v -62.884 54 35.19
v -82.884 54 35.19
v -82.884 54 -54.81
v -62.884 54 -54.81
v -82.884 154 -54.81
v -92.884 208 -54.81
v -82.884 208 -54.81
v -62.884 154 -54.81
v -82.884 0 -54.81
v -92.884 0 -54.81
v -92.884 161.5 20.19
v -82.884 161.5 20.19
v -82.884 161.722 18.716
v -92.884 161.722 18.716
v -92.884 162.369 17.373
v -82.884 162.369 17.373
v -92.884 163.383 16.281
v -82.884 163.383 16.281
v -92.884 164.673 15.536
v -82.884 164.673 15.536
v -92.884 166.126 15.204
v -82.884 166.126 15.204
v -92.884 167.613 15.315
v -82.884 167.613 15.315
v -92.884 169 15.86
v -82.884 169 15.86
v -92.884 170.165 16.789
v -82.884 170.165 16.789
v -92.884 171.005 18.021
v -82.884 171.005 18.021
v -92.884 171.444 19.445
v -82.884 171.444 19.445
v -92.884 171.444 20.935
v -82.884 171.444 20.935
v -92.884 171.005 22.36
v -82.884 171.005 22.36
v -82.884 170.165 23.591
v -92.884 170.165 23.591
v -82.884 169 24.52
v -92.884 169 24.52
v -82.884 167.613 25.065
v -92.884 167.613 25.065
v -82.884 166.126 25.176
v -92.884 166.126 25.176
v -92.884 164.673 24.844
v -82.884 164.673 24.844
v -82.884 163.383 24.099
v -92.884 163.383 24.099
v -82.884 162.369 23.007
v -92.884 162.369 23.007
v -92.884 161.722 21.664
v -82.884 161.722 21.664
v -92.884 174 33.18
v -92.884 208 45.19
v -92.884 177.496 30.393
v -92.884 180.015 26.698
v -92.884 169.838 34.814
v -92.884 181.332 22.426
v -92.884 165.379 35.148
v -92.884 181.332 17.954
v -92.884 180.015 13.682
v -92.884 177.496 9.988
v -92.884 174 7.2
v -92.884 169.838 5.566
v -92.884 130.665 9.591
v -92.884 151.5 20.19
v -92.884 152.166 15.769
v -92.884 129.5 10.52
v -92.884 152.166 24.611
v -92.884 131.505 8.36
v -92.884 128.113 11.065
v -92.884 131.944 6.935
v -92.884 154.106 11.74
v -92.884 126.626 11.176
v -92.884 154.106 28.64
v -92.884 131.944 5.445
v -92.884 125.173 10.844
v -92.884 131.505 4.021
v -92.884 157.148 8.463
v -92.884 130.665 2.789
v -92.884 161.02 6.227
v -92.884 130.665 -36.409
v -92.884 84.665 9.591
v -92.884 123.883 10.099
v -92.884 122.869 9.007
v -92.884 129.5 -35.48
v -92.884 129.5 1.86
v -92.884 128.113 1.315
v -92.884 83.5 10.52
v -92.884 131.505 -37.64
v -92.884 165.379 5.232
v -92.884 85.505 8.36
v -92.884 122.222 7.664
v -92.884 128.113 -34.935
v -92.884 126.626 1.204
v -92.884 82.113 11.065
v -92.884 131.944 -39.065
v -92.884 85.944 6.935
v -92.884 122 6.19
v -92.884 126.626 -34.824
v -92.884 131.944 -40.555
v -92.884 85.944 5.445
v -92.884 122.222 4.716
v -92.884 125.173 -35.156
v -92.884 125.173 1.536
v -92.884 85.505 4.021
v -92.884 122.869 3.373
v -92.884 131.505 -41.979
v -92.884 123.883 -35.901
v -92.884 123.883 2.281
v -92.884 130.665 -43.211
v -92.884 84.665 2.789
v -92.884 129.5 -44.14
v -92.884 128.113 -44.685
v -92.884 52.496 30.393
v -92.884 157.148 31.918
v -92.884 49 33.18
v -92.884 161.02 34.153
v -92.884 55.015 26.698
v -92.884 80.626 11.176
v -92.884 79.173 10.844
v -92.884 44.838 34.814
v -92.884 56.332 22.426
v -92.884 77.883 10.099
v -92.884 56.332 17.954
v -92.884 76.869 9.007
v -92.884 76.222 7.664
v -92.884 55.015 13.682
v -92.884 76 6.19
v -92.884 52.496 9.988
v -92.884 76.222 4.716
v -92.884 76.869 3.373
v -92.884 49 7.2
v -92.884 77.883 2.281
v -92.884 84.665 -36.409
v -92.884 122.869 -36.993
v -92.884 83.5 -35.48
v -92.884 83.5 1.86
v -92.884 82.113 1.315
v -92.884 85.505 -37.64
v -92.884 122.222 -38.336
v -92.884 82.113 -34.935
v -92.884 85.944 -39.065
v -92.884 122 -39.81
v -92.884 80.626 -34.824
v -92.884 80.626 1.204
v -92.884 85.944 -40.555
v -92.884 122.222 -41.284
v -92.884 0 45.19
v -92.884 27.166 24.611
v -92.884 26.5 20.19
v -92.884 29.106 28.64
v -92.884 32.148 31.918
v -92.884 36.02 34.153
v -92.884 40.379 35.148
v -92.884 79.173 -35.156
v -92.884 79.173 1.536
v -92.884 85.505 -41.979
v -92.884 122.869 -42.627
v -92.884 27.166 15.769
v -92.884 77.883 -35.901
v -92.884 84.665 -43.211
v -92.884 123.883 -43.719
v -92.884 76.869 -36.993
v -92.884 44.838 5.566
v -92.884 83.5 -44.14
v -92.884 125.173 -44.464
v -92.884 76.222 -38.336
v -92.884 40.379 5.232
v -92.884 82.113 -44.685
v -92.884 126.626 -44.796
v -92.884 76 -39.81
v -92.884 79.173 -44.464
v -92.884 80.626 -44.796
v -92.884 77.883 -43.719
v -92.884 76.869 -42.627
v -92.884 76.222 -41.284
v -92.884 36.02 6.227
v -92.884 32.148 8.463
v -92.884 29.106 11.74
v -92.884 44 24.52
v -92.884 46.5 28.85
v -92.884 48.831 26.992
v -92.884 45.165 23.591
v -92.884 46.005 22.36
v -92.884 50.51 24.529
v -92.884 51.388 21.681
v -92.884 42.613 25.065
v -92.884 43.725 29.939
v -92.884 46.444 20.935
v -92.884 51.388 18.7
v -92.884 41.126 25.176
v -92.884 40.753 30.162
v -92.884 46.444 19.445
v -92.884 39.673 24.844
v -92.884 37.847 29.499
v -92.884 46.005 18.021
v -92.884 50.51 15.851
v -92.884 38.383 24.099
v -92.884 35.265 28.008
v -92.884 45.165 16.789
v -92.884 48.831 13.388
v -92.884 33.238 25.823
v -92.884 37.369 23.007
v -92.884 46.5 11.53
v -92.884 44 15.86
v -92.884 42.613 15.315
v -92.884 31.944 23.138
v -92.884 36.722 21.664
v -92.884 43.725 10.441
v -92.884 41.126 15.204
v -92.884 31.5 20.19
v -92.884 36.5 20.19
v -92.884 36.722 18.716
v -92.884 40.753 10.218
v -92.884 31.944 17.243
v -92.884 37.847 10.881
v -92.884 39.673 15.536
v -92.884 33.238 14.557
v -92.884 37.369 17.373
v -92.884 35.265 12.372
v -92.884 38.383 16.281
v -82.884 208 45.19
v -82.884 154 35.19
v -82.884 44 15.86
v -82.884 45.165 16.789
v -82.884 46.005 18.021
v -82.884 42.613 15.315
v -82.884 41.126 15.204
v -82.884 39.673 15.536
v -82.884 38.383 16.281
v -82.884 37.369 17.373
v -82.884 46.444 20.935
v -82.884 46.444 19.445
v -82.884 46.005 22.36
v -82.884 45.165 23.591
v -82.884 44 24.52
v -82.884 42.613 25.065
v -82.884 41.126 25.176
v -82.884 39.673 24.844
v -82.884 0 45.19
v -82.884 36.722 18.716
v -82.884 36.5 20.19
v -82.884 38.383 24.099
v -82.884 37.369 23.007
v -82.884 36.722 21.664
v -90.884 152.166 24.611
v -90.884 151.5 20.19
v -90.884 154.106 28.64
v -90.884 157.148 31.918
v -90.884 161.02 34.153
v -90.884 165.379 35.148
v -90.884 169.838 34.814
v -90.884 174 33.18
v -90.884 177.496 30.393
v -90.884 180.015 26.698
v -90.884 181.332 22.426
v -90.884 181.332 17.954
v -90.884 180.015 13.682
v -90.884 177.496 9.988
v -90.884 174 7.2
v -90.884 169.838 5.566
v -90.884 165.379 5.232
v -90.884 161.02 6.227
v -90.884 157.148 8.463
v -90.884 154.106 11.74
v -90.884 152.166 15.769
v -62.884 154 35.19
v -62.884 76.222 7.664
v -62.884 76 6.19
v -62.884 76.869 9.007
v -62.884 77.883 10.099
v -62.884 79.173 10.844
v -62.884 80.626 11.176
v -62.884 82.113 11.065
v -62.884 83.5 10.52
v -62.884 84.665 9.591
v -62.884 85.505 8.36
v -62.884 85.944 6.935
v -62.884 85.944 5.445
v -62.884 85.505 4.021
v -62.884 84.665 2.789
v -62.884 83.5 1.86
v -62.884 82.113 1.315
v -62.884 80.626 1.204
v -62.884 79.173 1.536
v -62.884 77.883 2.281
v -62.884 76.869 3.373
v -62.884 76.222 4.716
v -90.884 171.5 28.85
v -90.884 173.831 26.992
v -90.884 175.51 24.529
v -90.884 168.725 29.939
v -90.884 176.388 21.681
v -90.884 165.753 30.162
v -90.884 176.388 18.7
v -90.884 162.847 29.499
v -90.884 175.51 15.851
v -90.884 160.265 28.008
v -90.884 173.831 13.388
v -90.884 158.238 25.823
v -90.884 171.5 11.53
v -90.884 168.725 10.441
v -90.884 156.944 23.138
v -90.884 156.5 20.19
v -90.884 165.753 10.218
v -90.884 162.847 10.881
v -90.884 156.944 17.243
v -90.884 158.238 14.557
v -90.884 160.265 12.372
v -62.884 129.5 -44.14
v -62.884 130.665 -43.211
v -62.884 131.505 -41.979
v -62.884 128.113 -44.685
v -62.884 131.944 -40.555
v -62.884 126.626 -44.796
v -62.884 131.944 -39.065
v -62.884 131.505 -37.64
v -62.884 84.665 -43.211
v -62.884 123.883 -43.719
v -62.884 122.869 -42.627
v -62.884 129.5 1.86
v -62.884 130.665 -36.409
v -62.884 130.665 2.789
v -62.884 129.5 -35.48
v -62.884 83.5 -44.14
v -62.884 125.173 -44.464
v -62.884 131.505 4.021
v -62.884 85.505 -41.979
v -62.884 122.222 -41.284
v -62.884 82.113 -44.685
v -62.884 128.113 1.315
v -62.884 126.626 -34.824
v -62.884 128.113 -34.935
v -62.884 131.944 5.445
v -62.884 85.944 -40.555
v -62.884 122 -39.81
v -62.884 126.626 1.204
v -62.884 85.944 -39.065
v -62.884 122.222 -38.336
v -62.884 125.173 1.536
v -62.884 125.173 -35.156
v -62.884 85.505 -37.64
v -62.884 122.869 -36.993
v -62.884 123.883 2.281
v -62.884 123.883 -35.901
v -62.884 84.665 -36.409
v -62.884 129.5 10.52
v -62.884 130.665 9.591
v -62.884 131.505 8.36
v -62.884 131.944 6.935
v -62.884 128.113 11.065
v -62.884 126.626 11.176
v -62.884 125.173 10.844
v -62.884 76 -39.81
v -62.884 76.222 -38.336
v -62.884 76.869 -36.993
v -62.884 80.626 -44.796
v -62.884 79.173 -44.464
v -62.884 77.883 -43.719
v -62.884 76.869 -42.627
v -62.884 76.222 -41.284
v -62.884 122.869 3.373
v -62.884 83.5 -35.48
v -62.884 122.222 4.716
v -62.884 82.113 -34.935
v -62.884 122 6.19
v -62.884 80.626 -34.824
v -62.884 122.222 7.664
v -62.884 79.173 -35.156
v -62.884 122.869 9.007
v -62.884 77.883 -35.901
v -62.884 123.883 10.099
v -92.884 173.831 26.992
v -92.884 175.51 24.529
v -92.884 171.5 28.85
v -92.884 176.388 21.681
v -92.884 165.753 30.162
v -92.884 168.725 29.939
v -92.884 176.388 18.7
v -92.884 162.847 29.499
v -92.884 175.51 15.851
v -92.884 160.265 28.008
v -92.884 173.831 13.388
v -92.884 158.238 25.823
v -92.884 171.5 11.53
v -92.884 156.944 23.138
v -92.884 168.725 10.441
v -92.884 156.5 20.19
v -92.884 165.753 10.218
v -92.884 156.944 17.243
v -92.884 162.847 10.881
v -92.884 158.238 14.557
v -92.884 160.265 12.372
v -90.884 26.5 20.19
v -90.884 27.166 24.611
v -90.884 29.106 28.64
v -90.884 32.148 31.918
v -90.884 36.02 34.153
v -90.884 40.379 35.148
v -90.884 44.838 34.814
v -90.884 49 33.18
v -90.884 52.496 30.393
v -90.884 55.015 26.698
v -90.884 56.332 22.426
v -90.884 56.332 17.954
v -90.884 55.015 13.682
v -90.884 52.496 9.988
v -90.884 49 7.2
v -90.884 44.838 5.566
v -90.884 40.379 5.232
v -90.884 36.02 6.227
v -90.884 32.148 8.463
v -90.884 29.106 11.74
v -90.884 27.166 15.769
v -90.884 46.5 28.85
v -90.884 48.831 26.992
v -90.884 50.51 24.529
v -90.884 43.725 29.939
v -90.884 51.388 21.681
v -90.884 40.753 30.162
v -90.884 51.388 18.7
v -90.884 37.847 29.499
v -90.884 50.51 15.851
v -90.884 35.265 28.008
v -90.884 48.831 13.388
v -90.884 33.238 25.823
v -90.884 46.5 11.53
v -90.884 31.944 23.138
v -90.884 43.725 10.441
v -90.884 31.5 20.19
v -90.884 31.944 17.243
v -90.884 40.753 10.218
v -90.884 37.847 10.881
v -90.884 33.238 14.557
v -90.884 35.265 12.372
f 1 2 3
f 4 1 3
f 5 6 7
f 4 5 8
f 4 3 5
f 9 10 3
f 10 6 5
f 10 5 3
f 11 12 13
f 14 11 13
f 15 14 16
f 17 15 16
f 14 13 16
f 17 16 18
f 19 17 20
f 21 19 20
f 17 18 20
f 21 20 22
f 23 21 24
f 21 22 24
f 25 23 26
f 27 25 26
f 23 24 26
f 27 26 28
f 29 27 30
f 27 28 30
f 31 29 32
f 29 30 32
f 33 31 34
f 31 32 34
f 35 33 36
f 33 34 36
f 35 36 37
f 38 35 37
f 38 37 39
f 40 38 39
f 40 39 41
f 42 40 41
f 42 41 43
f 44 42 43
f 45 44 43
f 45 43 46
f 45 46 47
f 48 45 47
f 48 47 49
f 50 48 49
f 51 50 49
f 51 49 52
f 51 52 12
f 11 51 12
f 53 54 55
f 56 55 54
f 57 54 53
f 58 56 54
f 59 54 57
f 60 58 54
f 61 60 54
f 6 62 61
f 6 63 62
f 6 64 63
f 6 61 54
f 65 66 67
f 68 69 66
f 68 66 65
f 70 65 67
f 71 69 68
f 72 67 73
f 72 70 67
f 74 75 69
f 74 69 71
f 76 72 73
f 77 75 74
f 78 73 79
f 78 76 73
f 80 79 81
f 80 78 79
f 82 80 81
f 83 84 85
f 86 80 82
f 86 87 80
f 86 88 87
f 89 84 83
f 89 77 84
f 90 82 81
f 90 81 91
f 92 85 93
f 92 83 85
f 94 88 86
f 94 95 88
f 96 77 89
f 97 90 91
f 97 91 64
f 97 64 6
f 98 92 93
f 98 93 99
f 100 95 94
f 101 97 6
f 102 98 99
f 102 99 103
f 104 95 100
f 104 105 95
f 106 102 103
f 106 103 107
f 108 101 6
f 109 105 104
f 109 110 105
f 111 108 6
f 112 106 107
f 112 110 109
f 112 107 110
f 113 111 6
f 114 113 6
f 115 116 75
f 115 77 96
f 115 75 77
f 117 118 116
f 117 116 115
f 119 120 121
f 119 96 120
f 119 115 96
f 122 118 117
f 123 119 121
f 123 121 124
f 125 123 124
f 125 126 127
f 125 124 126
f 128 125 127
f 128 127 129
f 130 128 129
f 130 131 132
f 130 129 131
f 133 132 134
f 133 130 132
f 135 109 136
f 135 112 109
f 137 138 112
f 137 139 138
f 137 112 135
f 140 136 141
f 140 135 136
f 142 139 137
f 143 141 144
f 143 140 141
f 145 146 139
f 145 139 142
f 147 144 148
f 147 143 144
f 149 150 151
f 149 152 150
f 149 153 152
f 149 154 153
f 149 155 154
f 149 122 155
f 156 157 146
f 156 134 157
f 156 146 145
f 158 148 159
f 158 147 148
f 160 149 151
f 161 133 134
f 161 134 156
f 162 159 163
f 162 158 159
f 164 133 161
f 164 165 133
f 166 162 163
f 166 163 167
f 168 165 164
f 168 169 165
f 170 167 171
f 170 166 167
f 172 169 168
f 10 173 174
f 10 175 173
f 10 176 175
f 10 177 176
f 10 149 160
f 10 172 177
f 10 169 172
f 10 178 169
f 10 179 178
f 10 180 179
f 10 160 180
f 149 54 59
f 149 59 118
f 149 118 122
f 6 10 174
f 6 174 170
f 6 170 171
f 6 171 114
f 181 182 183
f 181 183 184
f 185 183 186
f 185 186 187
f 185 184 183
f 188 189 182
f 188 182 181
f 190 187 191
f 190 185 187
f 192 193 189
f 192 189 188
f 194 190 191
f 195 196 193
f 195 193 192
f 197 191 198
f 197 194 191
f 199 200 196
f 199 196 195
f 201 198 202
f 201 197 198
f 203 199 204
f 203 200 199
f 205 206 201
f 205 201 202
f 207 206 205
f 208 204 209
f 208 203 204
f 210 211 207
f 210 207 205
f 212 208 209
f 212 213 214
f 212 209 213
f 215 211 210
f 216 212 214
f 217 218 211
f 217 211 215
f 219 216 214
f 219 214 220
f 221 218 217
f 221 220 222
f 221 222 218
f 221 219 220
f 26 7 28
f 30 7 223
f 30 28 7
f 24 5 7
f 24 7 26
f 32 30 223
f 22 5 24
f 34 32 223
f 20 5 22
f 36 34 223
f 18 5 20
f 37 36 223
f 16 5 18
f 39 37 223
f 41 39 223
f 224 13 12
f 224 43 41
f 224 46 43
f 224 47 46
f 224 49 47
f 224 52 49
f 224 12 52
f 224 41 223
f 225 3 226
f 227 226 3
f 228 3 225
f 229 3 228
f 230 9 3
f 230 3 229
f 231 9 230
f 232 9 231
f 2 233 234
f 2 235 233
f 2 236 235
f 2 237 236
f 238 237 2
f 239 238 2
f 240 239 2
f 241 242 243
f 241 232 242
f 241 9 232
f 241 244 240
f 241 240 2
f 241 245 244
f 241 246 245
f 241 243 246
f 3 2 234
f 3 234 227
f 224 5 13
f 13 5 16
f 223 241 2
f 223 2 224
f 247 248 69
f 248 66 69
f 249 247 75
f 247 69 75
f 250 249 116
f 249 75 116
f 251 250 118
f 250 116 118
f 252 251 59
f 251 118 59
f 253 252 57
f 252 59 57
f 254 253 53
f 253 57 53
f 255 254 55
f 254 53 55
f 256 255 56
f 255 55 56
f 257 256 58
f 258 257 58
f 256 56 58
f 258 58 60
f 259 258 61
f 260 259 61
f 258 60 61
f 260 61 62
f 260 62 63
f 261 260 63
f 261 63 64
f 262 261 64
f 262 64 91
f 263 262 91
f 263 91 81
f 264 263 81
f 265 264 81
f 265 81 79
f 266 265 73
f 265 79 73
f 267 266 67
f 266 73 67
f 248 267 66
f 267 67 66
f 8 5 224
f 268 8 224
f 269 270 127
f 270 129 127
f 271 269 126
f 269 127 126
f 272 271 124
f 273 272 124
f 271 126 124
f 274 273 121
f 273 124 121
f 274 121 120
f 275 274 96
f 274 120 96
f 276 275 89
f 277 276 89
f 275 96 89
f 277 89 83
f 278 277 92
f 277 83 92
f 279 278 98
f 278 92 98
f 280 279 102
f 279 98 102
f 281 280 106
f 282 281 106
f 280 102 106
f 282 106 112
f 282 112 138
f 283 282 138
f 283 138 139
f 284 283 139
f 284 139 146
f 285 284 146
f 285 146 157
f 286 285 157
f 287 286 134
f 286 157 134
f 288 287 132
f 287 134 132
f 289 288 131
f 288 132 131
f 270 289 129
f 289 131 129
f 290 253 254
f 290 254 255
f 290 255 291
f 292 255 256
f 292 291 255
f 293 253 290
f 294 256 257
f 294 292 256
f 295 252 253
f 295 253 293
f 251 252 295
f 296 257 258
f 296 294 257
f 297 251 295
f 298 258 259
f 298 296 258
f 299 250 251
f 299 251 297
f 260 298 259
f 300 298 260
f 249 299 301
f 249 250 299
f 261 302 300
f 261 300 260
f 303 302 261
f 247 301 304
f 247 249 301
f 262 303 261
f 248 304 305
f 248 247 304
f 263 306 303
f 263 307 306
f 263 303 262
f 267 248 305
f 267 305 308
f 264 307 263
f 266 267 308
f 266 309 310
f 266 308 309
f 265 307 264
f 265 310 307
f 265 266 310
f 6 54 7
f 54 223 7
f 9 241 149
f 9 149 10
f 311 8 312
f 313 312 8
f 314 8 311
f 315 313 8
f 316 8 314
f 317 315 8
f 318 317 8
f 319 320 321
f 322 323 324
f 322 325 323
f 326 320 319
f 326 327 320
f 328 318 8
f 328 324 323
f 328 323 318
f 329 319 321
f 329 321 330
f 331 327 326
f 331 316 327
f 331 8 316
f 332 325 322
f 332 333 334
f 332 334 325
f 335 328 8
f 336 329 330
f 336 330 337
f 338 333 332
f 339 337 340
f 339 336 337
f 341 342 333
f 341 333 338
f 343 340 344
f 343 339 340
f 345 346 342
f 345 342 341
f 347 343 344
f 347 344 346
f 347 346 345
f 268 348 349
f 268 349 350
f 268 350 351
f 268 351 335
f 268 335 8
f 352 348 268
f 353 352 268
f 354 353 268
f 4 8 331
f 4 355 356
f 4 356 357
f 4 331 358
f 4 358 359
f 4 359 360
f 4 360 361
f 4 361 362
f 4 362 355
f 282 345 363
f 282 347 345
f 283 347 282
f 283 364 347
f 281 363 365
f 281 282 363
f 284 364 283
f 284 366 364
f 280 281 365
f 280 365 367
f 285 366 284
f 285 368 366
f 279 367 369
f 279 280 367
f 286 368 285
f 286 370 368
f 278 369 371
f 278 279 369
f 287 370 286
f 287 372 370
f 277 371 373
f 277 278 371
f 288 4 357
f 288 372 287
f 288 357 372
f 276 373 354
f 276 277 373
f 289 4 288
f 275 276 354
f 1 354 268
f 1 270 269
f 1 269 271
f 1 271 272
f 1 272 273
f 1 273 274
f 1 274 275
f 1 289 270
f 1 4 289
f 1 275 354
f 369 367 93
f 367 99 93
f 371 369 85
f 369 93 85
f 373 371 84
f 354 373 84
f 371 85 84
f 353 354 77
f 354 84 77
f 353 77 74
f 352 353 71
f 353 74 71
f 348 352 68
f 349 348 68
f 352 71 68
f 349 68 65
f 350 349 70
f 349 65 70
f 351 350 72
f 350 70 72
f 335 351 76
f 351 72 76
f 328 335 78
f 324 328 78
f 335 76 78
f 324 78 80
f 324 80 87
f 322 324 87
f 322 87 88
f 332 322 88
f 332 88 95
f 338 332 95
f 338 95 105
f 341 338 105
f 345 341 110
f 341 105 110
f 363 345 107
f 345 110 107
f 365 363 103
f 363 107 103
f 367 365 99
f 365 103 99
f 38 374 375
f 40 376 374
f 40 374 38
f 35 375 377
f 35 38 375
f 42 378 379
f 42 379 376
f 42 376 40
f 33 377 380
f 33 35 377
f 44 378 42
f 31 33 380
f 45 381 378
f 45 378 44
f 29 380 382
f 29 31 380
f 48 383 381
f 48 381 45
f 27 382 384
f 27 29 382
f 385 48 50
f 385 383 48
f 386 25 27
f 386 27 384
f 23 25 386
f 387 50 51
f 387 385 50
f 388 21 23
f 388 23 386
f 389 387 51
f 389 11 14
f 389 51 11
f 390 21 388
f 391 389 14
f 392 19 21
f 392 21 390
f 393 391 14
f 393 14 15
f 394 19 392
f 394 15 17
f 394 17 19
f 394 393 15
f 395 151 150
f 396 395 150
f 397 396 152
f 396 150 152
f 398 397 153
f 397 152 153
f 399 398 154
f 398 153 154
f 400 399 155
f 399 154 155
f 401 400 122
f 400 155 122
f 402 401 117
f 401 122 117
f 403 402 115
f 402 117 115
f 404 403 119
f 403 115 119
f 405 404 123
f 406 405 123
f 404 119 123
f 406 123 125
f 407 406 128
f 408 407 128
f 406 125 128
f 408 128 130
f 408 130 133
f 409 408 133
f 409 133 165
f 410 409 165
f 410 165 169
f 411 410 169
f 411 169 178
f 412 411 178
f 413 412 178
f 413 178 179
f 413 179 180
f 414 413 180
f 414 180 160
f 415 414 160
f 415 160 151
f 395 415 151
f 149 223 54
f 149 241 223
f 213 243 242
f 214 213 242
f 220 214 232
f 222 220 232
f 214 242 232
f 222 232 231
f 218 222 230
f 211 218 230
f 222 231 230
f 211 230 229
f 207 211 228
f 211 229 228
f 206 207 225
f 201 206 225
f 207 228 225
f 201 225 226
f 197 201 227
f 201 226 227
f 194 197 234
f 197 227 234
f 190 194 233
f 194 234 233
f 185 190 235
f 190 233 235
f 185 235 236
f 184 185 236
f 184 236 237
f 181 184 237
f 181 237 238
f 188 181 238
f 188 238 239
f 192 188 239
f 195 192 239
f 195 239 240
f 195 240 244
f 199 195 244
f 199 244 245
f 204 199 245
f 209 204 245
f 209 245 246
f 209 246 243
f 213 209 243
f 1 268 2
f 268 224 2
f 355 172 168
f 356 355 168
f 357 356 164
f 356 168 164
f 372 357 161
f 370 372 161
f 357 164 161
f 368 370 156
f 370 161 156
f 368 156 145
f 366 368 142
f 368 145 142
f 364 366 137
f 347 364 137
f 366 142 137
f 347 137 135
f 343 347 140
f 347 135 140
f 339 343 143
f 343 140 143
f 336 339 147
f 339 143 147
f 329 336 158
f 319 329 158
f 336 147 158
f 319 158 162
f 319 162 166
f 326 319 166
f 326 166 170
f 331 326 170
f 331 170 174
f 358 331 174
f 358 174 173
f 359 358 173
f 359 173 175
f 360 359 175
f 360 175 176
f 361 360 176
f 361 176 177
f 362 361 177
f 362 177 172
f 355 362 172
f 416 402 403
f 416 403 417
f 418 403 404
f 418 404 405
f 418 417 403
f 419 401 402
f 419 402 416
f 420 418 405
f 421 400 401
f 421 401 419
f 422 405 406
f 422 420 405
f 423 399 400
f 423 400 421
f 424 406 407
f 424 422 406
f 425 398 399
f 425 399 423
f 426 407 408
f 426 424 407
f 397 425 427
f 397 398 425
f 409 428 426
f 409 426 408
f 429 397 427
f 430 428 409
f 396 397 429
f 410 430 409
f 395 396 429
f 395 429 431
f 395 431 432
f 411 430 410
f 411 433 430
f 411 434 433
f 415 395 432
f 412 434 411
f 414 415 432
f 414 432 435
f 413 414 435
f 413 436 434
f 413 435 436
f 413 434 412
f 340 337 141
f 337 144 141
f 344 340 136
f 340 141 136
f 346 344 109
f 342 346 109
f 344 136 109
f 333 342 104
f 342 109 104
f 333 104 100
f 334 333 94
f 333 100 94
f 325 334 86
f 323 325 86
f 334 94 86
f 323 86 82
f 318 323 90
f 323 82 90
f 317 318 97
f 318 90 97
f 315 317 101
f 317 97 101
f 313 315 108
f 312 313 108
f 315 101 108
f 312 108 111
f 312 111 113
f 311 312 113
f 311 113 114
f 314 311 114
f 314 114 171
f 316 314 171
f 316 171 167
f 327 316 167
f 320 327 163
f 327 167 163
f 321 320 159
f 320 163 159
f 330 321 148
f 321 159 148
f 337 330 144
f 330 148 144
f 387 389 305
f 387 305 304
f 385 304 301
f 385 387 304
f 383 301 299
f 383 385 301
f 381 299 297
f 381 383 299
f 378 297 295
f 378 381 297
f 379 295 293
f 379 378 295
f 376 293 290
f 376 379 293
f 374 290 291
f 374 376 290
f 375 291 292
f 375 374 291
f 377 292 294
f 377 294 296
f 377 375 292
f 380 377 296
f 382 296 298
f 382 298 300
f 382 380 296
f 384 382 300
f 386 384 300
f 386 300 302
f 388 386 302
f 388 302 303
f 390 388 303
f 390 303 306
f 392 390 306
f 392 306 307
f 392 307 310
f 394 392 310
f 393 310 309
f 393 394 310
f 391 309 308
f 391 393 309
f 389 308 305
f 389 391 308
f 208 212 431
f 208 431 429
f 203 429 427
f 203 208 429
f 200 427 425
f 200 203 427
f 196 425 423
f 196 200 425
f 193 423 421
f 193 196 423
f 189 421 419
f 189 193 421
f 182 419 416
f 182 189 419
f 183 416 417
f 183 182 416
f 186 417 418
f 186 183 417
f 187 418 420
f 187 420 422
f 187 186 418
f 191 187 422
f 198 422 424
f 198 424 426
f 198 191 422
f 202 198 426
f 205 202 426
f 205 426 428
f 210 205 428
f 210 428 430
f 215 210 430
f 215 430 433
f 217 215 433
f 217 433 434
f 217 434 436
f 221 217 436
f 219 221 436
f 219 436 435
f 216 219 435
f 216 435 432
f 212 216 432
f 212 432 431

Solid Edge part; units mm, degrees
sketch "Sketch1" plane through (0, 0, 0) normal (0, -1, 0) x (1, 0, 0)
  line L0 (-92.8835, -54.8099) -> (-82.8835, -54.8099)
  line L1 (-82.8835, -54.8099) -> (-82.8835, 45.1901)
  line L2 (-82.8835, 45.1901) -> (-92.8835, 45.1901)
  line L3 (-92.8835, 45.1901) -> (-92.8835, -54.8099)
  dimension "D1" = 10
  dimension "D2" = 100
extrude "Protrusion1" add sketch "Sketch1" against normal blind 208
sketch "Sketch2" plane through (-82.8835, 104, 0.1901) normal (1, 0, 0) x (0, -1, 0)
  line L0 (-50, -35) -> (50, -35)
  line L1 (50, -35) -> (50, 55)
  line L2 (50, 55) -> (-50, 55)
  line L3 (-50, 55) -> (-50, -35)
  dimension "D1" = 90
  dimension "D2" = 100
extrude "Protrusion2" add sketch "Sketch2" along normal blind 20
sketch "Sketch3" plane through (-82.8835, 100, 10.1901) normal (1, 0, 0) x (0, -1, 0)
  circle A0 centre (58.5, -10) radius 5
  circle A1 centre (-66.5, -10) radius 5
  dimension "D1" = 10
  dimension "D2" = 10
  dimension "D3" = 125
  dimension "D4" = 25
  dimension "D5" = 62.5
extrude "Cutout1" cut sketch "Sketch3" against normal through all
extrude "ExtrudedCutout_6" [suppressed]
sketch "Sketch4" plane through (-92.8835, 145.5, -4.8099) normal (-1, 0, 0) x (0, 1, 0)
  circle A0 centre (-18.5, 35) radius 3
  circle A1 centre (-18.5, -11) radius 3
  circle A2 centre (-64.5, -11) radius 3
  circle A3 centre (-64.5, 35) radius 3
  dimension "D1" = 46
  dimension "D2" = 46
  dimension "D3" = 6
  dimension "D4" = 6
  dimension "D5" = 6
  dimension "D6" = 6
  dimension "D7" = 15
  dimension "D8" = 23
extrude "Cutout2" cut sketch "Sketch4" against normal through all
sketch "Sketch5" plane through (-92.8835, 145.5, 0.1901) normal (-1, 0, 0) x (0, -1, 0)
  circle A0 centre (18.5, -40) radius 5
  circle A1 centre (64.5, -40) radius 5
  circle A2 centre (64.5, 6) radius 5
  circle A3 centre (18.5, 6) radius 5
  dimension "D1" = 10
  dimension "D2" = 10
  dimension "D3" = 10
  dimension "D4" = 10
extrude "Cutout3" cut sketch "Sketch5" against normal up to vertex (40 mm away)
sketch "Sketch6" plane through (-92.8835, 104, -4.8099) normal (-1, 0, 0) x (0, -1, 0)
  circle A0 centre (62.5, 25) radius 15
  circle A1 centre (-62.5, 25) radius 10
  circle A2 centre (62.5, 25) radius 10
  circle A3 centre (-62.5, 25) radius 15
  dimension "D1" = 30
  dimension "D2" = 30
  dimension "D3" = 20
  dimension "D4" = 20
extrude "ExtrudedCutout_9" cut sketch "Sketch6" against normal blind 2
properties material "Aluminum, 6061-T6"
